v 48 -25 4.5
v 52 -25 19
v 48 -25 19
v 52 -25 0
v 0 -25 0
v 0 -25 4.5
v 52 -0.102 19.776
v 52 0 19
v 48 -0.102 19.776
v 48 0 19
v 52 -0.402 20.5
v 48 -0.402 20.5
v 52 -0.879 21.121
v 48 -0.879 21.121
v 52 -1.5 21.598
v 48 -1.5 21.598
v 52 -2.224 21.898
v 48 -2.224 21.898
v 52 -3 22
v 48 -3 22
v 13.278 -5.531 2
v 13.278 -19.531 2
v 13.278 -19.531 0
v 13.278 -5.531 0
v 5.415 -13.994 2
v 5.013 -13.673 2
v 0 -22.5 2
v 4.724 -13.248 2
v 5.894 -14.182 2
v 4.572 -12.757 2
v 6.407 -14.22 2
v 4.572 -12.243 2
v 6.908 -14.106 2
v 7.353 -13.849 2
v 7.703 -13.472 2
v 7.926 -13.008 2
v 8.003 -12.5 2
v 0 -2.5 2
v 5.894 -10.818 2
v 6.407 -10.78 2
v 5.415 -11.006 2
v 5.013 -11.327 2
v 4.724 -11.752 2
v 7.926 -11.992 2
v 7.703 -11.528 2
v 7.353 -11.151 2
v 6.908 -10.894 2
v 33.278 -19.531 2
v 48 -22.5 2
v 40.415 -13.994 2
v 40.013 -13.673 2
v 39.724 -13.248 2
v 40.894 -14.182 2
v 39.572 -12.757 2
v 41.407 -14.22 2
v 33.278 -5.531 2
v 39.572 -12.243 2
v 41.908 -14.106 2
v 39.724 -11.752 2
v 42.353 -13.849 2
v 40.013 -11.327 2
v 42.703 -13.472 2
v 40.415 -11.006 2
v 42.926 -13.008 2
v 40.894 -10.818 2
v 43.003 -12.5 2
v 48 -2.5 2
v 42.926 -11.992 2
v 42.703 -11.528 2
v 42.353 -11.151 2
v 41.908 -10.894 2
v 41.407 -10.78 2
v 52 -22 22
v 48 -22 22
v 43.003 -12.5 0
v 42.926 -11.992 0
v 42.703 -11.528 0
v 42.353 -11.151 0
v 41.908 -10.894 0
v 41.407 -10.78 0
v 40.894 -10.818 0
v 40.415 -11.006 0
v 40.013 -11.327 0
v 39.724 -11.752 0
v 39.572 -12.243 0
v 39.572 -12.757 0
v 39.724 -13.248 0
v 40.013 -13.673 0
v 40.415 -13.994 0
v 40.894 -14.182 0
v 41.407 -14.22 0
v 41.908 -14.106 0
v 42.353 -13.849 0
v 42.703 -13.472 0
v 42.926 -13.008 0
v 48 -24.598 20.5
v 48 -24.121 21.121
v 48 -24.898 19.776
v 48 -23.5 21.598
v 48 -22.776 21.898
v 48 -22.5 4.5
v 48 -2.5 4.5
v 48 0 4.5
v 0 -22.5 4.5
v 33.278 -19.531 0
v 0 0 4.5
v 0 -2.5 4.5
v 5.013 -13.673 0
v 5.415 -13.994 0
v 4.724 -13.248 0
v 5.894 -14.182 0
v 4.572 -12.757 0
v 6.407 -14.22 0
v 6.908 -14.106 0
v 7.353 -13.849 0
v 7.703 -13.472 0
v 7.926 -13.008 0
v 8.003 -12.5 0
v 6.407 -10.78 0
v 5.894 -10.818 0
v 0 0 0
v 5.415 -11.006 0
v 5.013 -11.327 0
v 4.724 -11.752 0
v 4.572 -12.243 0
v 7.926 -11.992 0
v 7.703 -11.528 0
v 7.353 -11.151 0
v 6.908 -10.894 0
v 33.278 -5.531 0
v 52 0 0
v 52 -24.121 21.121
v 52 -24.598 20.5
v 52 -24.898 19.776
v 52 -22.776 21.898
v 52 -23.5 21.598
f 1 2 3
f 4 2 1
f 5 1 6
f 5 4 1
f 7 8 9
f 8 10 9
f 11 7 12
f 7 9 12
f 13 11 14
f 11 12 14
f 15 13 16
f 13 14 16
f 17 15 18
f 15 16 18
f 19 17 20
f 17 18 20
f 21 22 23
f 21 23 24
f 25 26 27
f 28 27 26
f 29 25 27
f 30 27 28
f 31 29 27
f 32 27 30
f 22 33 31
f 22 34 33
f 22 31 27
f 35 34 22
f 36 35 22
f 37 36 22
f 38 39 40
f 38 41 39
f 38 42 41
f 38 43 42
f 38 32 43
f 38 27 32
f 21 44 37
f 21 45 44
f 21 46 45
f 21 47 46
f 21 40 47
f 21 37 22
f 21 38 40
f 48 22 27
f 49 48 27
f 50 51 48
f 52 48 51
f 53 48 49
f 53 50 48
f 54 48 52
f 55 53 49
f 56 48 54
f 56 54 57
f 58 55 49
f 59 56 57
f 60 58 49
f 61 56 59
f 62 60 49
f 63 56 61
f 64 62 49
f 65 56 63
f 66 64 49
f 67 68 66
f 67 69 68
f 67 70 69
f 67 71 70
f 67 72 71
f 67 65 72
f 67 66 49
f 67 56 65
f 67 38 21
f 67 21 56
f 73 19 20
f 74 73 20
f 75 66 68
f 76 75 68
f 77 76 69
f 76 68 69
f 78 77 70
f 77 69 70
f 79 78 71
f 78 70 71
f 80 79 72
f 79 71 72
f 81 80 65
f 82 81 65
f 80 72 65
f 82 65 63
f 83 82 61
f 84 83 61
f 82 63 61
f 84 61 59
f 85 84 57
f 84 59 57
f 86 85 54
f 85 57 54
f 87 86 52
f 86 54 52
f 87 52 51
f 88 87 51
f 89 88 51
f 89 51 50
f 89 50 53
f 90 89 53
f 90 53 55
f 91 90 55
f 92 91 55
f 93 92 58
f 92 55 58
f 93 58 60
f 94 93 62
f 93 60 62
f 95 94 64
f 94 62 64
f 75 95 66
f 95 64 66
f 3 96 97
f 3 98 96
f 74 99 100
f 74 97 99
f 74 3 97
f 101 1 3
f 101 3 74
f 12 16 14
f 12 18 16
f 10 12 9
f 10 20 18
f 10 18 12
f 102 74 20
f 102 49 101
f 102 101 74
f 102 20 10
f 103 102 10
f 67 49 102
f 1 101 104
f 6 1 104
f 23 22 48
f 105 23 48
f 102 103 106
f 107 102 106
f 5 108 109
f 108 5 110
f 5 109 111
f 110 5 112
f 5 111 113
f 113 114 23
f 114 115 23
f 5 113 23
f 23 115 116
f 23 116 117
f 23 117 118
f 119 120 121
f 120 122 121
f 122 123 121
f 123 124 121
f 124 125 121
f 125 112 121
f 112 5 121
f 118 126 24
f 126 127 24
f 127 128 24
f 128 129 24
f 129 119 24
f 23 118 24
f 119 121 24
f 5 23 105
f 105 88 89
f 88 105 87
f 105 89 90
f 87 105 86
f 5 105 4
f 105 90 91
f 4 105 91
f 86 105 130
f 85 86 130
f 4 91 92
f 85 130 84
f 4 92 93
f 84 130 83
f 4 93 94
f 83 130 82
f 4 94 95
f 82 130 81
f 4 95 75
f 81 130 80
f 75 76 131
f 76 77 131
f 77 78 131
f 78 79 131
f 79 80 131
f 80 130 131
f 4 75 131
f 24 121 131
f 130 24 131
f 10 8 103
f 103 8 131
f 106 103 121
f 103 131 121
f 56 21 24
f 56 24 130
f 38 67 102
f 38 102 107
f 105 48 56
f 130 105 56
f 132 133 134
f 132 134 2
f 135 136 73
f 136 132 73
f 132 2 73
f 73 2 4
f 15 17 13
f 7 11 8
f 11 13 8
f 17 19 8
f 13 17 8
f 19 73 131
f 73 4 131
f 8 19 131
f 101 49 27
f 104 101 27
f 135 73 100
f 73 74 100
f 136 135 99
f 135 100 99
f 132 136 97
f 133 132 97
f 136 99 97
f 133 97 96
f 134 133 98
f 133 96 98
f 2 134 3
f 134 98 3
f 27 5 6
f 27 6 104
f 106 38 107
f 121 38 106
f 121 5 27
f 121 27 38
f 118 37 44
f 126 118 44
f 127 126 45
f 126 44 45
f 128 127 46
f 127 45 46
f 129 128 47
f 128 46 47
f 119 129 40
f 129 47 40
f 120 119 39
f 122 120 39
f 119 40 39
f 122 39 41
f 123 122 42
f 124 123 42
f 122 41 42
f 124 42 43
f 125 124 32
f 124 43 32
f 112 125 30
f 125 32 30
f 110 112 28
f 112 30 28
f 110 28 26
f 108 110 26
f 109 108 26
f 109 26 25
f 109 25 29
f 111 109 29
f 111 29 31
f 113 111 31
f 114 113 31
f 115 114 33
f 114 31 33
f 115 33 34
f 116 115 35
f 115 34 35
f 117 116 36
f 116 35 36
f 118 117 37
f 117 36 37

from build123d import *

# Parameters (mm, degrees)
SKETCH1_W           = 52
SKETCH1_H           = 25
BOSS_EXTRUDE1_DEPTH = 2
SKETCH2_W           = 4
SKETCH2_H           = 25
BOSS_EXTRUDE2_DEPTH = 20
FILLET1_R           = 3
SKETCH4_R           = 1.725
CUT_EXTRUDE2_DEPTH  = 2
SKETCH5_W           = 48
SKETCH5_H           = 2.5
BOSS_EXTRUDE3_DEPTH = 2.5
SKETCH6_W           = 20
SKETCH6_H           = 14
CUT_EXTRUDE3_DEPTH  = 2


with BuildPart() as part:
    # Sketch1 → Boss-Extrude1 (new body)
    with BuildSketch(Plane.XY):
        with Locations((26, -12.5)):
            Rectangle(SKETCH1_W, SKETCH1_H)
    extrude(amount=BOSS_EXTRUDE1_DEPTH)

    # Sketch2 → Boss-Extrude2 (add)
    with BuildSketch(Plane(origin=(0, 0, 2), x_dir=(-1, 0, 0), z_dir=(0, 0, -1))):
        with Locations((-50, -12.5)):
            Rectangle(SKETCH2_W, SKETCH2_H)
    extrude(amount=-BOSS_EXTRUDE2_DEPTH)

    # Fillet1
    fillet1_edges = [part.edges().sort_by_distance(p)[0] for p in [
        (50, -25, 22),
        (50, 0, 22),
    ]]
    fillet(fillet1_edges, radius=FILLET1_R)

    # Sketch4 → Cut-Extrude2 (cut)
    with BuildSketch(Plane.XY.offset(2)):
        with Locations((41.277695867, -12.5)):
            Circle(SKETCH4_R)
        with Locations((6.277695867, -12.5)):
            Circle(SKETCH4_R)
    extrude(amount=-CUT_EXTRUDE2_DEPTH, mode=Mode.SUBTRACT)

    # Sketch5 → Boss-Extrude3 (add)
    with BuildSketch(Plane(origin=(0, 0, 2), x_dir=(-1, 0, 0), z_dir=(0, 0, -1))):
        with Locations((-24, -23.75)):
            Rectangle(SKETCH5_W, SKETCH5_H)
        with Locations((-24, -1.25)):
            Rectangle(SKETCH5_W, SKETCH5_H)
    extrude(amount=-BOSS_EXTRUDE3_DEPTH)

    # Sketch6 → Cut-Extrude3 (cut)
    with BuildSketch(Plane.XY.offset(2)):
        with Locations((23.277695867, -12.531043961)):
            Rectangle(SKETCH6_W, SKETCH6_H)
    extrude(amount=-CUT_EXTRUDE3_DEPTH, mode=Mode.SUBTRACT)


solid = part.part
